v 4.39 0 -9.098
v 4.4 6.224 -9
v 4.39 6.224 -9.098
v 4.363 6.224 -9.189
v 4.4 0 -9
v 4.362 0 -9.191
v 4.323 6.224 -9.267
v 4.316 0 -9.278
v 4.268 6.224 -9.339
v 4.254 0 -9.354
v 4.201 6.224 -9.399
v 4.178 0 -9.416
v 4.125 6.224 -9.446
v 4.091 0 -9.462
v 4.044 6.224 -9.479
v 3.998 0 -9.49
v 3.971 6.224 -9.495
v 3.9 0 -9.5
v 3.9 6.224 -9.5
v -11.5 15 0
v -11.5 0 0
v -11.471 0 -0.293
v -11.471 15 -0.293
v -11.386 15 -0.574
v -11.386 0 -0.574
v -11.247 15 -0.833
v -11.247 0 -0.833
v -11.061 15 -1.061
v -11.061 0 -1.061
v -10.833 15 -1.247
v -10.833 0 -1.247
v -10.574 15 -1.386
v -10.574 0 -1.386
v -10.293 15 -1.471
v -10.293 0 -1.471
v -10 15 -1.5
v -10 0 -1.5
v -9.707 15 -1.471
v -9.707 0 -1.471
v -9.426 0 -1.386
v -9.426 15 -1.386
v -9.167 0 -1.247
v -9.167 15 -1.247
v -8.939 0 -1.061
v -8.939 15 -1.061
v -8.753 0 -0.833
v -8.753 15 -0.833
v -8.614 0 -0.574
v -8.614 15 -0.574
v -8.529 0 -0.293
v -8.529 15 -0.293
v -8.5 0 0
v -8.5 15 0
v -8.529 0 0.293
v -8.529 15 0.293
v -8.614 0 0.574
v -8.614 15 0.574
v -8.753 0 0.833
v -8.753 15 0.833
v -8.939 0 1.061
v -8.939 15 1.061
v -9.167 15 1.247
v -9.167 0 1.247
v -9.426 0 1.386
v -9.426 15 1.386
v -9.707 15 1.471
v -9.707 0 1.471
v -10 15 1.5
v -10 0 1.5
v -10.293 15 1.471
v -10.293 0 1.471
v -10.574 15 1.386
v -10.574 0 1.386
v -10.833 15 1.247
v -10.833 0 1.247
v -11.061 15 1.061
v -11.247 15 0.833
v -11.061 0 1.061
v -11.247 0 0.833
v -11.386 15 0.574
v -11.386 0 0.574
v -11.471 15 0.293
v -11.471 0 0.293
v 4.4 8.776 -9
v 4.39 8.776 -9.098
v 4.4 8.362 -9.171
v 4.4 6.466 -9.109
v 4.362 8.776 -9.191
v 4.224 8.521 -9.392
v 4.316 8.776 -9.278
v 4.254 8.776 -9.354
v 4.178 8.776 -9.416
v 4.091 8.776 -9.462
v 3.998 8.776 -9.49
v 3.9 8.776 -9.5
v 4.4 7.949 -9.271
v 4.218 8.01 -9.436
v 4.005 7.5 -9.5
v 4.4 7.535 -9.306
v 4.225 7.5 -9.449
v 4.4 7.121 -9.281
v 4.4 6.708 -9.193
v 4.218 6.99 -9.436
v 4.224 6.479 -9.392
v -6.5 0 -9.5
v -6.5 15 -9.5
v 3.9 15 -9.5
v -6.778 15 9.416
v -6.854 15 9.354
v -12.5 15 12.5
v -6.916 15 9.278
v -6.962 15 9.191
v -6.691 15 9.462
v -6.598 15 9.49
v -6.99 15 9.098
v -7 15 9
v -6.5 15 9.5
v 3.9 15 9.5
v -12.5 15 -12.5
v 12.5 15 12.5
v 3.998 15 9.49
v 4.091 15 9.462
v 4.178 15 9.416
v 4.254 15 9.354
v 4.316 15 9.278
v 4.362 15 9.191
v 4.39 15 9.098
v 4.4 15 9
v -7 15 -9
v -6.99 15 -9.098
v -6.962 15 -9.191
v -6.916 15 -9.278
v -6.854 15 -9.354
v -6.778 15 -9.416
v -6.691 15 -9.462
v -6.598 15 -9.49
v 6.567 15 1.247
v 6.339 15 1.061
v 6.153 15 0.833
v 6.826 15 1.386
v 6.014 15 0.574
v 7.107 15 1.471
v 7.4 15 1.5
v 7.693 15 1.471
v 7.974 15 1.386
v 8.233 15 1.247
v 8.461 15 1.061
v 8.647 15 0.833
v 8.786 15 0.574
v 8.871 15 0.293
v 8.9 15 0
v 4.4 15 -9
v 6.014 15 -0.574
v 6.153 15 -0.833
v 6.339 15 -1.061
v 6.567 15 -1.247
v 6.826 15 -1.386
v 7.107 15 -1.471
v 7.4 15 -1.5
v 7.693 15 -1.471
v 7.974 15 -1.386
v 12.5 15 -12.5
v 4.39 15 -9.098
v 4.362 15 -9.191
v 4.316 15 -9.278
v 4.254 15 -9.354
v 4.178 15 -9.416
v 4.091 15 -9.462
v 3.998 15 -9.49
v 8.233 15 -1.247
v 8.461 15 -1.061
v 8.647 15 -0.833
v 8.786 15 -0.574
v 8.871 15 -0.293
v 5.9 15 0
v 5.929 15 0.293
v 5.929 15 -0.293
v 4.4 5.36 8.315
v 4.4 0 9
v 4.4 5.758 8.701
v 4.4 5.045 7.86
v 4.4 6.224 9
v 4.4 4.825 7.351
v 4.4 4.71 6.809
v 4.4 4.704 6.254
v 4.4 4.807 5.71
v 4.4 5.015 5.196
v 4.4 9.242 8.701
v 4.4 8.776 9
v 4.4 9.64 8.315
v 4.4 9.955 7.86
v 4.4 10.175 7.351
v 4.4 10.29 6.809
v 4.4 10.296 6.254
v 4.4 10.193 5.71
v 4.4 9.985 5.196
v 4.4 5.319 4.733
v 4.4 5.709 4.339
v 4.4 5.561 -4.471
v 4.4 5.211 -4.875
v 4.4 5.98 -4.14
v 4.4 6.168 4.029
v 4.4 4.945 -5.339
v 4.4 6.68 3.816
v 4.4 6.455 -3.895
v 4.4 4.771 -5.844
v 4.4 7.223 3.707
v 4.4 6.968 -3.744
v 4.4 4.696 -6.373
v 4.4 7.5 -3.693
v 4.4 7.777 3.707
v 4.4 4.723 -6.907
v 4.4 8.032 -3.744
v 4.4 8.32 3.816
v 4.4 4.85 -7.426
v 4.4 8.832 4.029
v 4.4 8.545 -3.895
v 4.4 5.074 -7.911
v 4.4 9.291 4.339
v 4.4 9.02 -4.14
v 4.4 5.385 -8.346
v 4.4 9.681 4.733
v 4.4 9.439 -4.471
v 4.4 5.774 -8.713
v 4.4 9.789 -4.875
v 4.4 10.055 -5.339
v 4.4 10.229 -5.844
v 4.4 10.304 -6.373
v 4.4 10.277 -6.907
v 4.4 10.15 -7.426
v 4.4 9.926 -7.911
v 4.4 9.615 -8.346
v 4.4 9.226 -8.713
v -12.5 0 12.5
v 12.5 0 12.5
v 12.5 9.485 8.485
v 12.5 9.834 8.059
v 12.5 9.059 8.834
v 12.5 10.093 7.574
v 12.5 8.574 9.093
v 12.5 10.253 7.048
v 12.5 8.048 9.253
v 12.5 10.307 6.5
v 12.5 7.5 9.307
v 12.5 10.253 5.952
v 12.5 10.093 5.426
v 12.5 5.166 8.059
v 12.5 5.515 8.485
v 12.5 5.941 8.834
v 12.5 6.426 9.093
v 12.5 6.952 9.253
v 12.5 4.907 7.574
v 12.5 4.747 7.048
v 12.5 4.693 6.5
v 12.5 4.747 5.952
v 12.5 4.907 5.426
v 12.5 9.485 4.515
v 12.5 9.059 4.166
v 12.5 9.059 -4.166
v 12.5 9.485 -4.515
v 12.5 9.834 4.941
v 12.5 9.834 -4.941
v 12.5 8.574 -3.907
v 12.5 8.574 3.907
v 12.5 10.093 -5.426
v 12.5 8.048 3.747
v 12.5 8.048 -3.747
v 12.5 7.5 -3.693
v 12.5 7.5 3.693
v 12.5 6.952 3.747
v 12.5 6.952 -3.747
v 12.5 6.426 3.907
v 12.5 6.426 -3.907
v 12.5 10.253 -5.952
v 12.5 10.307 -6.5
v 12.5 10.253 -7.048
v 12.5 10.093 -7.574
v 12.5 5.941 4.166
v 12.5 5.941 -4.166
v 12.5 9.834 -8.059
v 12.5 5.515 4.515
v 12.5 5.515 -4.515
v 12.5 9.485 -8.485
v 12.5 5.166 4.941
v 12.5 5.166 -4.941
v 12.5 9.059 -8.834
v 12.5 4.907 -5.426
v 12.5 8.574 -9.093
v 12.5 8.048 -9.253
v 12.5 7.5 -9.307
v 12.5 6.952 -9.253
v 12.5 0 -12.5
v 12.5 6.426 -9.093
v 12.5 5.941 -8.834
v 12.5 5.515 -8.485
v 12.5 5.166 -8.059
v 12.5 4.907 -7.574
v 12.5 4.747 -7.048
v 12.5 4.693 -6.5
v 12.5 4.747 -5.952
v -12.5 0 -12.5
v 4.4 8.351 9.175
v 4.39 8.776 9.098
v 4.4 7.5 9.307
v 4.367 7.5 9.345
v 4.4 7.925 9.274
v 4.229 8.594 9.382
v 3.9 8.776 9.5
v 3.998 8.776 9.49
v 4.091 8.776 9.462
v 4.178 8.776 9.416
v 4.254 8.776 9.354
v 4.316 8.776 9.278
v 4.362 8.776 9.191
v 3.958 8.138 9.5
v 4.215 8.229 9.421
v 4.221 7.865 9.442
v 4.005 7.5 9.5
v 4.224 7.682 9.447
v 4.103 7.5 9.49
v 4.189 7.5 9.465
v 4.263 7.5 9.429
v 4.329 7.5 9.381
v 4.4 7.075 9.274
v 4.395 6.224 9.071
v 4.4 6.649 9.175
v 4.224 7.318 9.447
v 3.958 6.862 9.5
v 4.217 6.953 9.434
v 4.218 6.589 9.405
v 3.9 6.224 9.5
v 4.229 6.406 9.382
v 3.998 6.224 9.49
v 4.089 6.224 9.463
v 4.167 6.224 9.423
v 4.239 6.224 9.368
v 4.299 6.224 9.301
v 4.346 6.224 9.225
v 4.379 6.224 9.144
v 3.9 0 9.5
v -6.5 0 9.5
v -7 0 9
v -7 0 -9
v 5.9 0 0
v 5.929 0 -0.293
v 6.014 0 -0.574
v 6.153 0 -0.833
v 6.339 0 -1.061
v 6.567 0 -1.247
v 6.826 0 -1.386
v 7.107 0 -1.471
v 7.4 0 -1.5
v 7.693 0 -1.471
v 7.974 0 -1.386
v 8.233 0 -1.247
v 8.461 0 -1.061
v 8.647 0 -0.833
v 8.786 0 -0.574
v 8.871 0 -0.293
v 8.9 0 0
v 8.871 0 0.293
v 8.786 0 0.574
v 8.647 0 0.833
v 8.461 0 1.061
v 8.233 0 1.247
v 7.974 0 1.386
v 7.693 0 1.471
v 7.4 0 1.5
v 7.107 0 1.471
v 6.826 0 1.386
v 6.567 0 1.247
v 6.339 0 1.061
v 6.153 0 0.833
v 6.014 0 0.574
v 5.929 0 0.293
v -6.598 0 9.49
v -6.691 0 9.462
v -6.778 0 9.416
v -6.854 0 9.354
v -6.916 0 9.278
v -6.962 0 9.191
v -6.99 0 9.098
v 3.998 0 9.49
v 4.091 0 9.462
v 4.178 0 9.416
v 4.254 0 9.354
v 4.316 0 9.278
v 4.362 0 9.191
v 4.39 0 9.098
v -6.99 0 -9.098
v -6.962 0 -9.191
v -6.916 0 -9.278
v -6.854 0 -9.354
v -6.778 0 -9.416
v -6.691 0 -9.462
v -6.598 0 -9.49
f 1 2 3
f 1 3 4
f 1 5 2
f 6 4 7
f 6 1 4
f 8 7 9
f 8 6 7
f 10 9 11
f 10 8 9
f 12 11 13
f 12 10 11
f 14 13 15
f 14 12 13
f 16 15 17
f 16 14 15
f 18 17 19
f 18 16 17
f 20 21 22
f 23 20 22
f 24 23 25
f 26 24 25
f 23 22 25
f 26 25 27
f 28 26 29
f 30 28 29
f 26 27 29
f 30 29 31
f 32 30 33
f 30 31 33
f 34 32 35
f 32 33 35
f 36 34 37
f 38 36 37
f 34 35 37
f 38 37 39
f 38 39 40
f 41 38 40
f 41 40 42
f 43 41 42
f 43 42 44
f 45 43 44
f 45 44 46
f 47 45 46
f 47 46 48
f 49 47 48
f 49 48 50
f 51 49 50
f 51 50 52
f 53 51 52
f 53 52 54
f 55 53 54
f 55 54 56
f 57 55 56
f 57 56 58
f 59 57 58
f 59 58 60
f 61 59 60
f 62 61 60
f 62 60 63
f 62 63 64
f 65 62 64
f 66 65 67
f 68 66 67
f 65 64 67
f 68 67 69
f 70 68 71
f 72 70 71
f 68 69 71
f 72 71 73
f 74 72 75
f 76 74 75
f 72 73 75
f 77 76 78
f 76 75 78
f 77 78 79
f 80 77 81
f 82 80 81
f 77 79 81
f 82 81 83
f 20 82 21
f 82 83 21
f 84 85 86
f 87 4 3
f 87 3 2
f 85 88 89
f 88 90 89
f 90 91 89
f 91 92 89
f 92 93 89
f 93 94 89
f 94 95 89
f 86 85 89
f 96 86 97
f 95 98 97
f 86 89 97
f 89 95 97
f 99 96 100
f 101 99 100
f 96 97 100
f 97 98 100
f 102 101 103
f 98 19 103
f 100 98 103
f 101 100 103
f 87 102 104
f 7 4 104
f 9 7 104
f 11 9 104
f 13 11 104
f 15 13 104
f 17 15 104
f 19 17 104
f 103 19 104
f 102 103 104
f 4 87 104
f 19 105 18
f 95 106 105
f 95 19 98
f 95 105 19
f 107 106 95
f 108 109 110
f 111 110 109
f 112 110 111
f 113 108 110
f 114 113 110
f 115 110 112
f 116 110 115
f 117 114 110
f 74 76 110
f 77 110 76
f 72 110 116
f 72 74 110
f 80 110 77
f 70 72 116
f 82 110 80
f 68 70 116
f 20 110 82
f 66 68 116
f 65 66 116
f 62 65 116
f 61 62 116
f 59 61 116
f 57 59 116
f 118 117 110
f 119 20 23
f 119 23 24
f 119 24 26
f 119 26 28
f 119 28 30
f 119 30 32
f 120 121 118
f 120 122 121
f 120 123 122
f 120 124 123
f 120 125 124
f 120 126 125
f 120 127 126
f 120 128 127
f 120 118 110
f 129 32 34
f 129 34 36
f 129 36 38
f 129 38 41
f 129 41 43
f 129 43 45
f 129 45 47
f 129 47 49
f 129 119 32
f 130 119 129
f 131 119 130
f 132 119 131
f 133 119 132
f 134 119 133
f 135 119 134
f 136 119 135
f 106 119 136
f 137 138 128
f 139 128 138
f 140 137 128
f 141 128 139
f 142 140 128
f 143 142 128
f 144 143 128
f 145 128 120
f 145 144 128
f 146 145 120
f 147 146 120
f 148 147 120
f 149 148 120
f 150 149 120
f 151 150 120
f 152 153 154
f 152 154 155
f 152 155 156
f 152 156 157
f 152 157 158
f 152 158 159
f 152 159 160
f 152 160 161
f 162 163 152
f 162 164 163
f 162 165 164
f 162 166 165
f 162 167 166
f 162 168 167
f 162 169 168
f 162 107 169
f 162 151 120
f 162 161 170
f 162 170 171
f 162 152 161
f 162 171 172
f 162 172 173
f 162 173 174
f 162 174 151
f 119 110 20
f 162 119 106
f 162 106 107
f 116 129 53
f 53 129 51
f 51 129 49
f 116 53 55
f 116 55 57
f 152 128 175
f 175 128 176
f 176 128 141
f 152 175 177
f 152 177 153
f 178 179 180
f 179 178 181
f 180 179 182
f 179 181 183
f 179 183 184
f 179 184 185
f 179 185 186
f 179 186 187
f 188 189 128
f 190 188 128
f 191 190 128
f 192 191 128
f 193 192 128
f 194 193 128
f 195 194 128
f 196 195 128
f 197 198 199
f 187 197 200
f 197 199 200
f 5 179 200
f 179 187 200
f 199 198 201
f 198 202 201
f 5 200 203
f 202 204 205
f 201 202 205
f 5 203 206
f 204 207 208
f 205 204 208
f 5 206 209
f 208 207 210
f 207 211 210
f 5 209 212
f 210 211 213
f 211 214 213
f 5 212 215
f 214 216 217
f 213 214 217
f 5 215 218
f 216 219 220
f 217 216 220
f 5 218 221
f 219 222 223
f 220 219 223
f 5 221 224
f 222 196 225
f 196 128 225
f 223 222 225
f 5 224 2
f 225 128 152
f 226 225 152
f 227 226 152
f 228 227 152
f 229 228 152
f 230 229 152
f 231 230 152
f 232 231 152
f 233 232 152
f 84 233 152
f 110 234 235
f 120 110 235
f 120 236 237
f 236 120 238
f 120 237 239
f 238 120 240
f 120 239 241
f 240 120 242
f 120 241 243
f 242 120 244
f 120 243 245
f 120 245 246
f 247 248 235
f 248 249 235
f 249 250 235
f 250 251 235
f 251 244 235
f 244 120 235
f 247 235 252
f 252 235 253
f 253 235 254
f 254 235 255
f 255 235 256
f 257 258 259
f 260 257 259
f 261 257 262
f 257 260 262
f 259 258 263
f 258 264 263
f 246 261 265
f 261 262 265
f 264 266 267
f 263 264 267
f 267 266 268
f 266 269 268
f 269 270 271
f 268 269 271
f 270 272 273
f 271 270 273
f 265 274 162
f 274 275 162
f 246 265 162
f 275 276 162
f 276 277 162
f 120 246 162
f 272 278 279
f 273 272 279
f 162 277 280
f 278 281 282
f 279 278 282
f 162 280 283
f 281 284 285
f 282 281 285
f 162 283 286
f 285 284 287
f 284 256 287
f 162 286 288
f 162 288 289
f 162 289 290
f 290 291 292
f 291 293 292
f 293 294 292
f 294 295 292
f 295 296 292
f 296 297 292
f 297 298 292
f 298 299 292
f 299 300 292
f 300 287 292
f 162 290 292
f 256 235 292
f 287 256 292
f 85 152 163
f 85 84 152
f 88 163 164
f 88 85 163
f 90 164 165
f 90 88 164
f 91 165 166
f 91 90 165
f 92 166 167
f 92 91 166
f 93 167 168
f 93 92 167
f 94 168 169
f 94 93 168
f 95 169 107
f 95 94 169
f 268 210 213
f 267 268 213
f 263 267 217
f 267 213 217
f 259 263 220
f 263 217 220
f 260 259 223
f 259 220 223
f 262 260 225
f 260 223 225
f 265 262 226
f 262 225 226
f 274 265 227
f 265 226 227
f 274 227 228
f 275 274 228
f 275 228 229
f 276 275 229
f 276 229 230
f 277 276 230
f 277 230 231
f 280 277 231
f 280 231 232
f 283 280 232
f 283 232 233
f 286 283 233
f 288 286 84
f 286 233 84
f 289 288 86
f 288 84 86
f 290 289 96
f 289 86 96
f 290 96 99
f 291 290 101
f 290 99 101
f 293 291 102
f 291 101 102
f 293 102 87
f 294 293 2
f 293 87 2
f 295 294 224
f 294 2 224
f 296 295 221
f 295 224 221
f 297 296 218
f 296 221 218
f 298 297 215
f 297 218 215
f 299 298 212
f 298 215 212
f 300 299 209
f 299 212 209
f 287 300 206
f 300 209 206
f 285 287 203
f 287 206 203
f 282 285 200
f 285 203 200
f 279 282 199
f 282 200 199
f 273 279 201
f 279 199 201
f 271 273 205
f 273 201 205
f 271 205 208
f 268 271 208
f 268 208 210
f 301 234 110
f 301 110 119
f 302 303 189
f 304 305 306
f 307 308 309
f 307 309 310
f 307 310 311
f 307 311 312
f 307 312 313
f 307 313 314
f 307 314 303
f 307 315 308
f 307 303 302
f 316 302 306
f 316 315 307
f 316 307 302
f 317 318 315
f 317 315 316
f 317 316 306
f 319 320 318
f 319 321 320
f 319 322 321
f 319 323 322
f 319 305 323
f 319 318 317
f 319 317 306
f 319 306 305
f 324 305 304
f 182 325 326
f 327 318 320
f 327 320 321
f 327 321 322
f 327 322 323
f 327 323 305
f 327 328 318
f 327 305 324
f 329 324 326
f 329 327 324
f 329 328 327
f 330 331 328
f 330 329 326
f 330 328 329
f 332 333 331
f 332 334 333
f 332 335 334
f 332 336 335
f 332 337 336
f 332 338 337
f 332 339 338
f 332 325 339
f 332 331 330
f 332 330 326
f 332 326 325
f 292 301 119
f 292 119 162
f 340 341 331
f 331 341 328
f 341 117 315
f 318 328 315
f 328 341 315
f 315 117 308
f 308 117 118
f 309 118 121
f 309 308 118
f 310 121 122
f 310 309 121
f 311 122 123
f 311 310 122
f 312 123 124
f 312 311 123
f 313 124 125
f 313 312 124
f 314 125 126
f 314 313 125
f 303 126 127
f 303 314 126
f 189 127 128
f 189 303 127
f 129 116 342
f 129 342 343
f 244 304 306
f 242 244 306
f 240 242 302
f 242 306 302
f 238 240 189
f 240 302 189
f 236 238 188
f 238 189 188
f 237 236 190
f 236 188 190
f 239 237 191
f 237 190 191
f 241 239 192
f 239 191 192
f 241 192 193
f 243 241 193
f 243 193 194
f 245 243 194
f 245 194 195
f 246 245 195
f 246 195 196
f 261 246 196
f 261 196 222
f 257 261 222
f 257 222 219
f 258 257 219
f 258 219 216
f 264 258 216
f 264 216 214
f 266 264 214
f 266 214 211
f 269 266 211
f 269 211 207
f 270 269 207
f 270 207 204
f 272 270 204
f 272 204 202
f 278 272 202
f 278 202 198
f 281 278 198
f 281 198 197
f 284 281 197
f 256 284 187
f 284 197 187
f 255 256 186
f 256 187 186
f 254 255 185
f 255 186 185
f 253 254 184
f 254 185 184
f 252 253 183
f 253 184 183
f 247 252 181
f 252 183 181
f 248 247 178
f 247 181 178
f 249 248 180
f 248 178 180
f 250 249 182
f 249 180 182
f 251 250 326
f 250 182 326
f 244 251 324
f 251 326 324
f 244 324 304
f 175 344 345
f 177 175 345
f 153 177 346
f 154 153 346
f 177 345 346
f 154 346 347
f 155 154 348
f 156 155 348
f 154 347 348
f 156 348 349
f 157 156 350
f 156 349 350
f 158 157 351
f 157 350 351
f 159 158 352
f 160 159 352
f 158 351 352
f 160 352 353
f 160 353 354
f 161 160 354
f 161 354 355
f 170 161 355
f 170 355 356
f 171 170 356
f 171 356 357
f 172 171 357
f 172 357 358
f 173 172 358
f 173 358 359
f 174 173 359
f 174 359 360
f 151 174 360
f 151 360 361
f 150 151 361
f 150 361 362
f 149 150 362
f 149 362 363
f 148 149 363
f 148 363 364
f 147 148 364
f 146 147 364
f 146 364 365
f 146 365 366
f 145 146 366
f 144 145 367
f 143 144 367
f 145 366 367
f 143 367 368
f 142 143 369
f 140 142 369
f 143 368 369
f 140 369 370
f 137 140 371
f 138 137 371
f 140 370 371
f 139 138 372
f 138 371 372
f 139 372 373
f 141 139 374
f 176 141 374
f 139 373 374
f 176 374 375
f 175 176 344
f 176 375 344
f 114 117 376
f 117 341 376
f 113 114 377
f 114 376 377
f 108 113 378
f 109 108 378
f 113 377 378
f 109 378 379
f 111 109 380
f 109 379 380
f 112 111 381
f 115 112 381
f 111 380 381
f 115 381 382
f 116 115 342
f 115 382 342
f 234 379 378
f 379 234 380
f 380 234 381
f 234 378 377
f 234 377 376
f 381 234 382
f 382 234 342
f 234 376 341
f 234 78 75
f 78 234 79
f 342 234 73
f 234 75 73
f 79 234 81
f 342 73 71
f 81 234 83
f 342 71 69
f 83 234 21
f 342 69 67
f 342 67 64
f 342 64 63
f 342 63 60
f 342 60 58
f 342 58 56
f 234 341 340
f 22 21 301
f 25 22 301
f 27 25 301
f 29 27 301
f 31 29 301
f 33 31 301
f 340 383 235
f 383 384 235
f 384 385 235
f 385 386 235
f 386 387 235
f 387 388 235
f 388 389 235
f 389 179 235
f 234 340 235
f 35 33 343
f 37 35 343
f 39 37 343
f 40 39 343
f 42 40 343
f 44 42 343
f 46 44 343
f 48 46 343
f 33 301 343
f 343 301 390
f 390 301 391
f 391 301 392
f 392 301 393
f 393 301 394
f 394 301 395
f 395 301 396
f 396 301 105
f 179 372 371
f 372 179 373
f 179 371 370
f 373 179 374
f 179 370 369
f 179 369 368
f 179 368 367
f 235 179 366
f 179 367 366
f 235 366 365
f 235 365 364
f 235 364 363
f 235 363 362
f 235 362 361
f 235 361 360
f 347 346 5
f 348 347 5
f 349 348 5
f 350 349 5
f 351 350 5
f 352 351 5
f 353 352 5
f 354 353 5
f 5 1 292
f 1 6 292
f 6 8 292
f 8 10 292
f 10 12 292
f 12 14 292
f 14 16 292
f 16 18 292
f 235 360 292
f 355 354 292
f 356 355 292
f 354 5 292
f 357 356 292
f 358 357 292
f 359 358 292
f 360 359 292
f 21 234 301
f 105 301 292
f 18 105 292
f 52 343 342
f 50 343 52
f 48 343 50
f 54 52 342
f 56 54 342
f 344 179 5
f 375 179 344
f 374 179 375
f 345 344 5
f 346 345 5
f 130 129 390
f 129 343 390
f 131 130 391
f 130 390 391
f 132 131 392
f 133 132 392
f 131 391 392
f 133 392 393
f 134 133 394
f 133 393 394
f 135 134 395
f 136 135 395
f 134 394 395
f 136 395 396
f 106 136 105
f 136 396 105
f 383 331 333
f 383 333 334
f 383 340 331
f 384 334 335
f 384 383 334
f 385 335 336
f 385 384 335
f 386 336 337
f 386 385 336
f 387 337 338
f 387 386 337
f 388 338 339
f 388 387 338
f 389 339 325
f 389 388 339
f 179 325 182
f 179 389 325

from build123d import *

# Parameters (mm, degrees)
SKETCH1_W             = 25
SKETCH1_H             = 25
BOSS_EXTRUDE1_DEPTH   = 15
SKETCH2_W             = 11.4
SKETCH2_H             = 19
CUT_EXTRUDE1_DEPTH    = 16
M3_CLEARANCE_HOLE1_D  = 3
FOR_M4_HEAT_SET_D     = 5.6134
FOR_M4_HEAT_SET_DEPTH = 8.1
FILLET1_R             = 0.5


with BuildPart() as part:
    # Sketch1 → Boss-Extrude1 (new body)
    with BuildSketch(Plane(origin=(0, 0, 0), x_dir=(1, 0, 0), z_dir=(0, 1, 0))):
        Rectangle(SKETCH1_W, SKETCH1_H)
    extrude(amount=BOSS_EXTRUDE1_DEPTH)

    # Sketch2 → Cut-Extrude1 (cut, through all)
    with BuildSketch(Plane(origin=(0, 15, 0), x_dir=(1, 0, 0), z_dir=(0, 1, 0))):
        with Locations((-1.3, 0)):
            Rectangle(SKETCH2_W, SKETCH2_H)
    extrude(amount=-CUT_EXTRUDE1_DEPTH, mode=Mode.SUBTRACT)

    # M3 Clearance Hole1 (through all)
    with Locations(Plane(origin=(0, 15, 0), x_dir=(1, 0, 0), z_dir=(0, 1, 0))):
        with Locations((-10, 0), (7.4, 0)):
            Hole(M3_CLEARANCE_HOLE1_D / 2)

    # for m4 heat set
    with Locations(Plane(origin=(12.5, 0, 0), x_dir=(0, 0, -1), z_dir=(1, 0, 0))):
        with Locations((-6.5, 7.5), (6.5, 7.5)):
            Hole(FOR_M4_HEAT_SET_D / 2, depth=FOR_M4_HEAT_SET_DEPTH)

    # Fillet1
    fillet1_edges = [part.edges().sort_by_distance(p)[0] for p in [
        (-7, 7.5, 9.5),
        (-7, 7.5, -9.5),
        (4.4, 7.5, -9.5),
        (4.4, 7.5, 9.5),
    ]]
    fillet(fillet1_edges, radius=FILLET1_R)


solid = part.part
